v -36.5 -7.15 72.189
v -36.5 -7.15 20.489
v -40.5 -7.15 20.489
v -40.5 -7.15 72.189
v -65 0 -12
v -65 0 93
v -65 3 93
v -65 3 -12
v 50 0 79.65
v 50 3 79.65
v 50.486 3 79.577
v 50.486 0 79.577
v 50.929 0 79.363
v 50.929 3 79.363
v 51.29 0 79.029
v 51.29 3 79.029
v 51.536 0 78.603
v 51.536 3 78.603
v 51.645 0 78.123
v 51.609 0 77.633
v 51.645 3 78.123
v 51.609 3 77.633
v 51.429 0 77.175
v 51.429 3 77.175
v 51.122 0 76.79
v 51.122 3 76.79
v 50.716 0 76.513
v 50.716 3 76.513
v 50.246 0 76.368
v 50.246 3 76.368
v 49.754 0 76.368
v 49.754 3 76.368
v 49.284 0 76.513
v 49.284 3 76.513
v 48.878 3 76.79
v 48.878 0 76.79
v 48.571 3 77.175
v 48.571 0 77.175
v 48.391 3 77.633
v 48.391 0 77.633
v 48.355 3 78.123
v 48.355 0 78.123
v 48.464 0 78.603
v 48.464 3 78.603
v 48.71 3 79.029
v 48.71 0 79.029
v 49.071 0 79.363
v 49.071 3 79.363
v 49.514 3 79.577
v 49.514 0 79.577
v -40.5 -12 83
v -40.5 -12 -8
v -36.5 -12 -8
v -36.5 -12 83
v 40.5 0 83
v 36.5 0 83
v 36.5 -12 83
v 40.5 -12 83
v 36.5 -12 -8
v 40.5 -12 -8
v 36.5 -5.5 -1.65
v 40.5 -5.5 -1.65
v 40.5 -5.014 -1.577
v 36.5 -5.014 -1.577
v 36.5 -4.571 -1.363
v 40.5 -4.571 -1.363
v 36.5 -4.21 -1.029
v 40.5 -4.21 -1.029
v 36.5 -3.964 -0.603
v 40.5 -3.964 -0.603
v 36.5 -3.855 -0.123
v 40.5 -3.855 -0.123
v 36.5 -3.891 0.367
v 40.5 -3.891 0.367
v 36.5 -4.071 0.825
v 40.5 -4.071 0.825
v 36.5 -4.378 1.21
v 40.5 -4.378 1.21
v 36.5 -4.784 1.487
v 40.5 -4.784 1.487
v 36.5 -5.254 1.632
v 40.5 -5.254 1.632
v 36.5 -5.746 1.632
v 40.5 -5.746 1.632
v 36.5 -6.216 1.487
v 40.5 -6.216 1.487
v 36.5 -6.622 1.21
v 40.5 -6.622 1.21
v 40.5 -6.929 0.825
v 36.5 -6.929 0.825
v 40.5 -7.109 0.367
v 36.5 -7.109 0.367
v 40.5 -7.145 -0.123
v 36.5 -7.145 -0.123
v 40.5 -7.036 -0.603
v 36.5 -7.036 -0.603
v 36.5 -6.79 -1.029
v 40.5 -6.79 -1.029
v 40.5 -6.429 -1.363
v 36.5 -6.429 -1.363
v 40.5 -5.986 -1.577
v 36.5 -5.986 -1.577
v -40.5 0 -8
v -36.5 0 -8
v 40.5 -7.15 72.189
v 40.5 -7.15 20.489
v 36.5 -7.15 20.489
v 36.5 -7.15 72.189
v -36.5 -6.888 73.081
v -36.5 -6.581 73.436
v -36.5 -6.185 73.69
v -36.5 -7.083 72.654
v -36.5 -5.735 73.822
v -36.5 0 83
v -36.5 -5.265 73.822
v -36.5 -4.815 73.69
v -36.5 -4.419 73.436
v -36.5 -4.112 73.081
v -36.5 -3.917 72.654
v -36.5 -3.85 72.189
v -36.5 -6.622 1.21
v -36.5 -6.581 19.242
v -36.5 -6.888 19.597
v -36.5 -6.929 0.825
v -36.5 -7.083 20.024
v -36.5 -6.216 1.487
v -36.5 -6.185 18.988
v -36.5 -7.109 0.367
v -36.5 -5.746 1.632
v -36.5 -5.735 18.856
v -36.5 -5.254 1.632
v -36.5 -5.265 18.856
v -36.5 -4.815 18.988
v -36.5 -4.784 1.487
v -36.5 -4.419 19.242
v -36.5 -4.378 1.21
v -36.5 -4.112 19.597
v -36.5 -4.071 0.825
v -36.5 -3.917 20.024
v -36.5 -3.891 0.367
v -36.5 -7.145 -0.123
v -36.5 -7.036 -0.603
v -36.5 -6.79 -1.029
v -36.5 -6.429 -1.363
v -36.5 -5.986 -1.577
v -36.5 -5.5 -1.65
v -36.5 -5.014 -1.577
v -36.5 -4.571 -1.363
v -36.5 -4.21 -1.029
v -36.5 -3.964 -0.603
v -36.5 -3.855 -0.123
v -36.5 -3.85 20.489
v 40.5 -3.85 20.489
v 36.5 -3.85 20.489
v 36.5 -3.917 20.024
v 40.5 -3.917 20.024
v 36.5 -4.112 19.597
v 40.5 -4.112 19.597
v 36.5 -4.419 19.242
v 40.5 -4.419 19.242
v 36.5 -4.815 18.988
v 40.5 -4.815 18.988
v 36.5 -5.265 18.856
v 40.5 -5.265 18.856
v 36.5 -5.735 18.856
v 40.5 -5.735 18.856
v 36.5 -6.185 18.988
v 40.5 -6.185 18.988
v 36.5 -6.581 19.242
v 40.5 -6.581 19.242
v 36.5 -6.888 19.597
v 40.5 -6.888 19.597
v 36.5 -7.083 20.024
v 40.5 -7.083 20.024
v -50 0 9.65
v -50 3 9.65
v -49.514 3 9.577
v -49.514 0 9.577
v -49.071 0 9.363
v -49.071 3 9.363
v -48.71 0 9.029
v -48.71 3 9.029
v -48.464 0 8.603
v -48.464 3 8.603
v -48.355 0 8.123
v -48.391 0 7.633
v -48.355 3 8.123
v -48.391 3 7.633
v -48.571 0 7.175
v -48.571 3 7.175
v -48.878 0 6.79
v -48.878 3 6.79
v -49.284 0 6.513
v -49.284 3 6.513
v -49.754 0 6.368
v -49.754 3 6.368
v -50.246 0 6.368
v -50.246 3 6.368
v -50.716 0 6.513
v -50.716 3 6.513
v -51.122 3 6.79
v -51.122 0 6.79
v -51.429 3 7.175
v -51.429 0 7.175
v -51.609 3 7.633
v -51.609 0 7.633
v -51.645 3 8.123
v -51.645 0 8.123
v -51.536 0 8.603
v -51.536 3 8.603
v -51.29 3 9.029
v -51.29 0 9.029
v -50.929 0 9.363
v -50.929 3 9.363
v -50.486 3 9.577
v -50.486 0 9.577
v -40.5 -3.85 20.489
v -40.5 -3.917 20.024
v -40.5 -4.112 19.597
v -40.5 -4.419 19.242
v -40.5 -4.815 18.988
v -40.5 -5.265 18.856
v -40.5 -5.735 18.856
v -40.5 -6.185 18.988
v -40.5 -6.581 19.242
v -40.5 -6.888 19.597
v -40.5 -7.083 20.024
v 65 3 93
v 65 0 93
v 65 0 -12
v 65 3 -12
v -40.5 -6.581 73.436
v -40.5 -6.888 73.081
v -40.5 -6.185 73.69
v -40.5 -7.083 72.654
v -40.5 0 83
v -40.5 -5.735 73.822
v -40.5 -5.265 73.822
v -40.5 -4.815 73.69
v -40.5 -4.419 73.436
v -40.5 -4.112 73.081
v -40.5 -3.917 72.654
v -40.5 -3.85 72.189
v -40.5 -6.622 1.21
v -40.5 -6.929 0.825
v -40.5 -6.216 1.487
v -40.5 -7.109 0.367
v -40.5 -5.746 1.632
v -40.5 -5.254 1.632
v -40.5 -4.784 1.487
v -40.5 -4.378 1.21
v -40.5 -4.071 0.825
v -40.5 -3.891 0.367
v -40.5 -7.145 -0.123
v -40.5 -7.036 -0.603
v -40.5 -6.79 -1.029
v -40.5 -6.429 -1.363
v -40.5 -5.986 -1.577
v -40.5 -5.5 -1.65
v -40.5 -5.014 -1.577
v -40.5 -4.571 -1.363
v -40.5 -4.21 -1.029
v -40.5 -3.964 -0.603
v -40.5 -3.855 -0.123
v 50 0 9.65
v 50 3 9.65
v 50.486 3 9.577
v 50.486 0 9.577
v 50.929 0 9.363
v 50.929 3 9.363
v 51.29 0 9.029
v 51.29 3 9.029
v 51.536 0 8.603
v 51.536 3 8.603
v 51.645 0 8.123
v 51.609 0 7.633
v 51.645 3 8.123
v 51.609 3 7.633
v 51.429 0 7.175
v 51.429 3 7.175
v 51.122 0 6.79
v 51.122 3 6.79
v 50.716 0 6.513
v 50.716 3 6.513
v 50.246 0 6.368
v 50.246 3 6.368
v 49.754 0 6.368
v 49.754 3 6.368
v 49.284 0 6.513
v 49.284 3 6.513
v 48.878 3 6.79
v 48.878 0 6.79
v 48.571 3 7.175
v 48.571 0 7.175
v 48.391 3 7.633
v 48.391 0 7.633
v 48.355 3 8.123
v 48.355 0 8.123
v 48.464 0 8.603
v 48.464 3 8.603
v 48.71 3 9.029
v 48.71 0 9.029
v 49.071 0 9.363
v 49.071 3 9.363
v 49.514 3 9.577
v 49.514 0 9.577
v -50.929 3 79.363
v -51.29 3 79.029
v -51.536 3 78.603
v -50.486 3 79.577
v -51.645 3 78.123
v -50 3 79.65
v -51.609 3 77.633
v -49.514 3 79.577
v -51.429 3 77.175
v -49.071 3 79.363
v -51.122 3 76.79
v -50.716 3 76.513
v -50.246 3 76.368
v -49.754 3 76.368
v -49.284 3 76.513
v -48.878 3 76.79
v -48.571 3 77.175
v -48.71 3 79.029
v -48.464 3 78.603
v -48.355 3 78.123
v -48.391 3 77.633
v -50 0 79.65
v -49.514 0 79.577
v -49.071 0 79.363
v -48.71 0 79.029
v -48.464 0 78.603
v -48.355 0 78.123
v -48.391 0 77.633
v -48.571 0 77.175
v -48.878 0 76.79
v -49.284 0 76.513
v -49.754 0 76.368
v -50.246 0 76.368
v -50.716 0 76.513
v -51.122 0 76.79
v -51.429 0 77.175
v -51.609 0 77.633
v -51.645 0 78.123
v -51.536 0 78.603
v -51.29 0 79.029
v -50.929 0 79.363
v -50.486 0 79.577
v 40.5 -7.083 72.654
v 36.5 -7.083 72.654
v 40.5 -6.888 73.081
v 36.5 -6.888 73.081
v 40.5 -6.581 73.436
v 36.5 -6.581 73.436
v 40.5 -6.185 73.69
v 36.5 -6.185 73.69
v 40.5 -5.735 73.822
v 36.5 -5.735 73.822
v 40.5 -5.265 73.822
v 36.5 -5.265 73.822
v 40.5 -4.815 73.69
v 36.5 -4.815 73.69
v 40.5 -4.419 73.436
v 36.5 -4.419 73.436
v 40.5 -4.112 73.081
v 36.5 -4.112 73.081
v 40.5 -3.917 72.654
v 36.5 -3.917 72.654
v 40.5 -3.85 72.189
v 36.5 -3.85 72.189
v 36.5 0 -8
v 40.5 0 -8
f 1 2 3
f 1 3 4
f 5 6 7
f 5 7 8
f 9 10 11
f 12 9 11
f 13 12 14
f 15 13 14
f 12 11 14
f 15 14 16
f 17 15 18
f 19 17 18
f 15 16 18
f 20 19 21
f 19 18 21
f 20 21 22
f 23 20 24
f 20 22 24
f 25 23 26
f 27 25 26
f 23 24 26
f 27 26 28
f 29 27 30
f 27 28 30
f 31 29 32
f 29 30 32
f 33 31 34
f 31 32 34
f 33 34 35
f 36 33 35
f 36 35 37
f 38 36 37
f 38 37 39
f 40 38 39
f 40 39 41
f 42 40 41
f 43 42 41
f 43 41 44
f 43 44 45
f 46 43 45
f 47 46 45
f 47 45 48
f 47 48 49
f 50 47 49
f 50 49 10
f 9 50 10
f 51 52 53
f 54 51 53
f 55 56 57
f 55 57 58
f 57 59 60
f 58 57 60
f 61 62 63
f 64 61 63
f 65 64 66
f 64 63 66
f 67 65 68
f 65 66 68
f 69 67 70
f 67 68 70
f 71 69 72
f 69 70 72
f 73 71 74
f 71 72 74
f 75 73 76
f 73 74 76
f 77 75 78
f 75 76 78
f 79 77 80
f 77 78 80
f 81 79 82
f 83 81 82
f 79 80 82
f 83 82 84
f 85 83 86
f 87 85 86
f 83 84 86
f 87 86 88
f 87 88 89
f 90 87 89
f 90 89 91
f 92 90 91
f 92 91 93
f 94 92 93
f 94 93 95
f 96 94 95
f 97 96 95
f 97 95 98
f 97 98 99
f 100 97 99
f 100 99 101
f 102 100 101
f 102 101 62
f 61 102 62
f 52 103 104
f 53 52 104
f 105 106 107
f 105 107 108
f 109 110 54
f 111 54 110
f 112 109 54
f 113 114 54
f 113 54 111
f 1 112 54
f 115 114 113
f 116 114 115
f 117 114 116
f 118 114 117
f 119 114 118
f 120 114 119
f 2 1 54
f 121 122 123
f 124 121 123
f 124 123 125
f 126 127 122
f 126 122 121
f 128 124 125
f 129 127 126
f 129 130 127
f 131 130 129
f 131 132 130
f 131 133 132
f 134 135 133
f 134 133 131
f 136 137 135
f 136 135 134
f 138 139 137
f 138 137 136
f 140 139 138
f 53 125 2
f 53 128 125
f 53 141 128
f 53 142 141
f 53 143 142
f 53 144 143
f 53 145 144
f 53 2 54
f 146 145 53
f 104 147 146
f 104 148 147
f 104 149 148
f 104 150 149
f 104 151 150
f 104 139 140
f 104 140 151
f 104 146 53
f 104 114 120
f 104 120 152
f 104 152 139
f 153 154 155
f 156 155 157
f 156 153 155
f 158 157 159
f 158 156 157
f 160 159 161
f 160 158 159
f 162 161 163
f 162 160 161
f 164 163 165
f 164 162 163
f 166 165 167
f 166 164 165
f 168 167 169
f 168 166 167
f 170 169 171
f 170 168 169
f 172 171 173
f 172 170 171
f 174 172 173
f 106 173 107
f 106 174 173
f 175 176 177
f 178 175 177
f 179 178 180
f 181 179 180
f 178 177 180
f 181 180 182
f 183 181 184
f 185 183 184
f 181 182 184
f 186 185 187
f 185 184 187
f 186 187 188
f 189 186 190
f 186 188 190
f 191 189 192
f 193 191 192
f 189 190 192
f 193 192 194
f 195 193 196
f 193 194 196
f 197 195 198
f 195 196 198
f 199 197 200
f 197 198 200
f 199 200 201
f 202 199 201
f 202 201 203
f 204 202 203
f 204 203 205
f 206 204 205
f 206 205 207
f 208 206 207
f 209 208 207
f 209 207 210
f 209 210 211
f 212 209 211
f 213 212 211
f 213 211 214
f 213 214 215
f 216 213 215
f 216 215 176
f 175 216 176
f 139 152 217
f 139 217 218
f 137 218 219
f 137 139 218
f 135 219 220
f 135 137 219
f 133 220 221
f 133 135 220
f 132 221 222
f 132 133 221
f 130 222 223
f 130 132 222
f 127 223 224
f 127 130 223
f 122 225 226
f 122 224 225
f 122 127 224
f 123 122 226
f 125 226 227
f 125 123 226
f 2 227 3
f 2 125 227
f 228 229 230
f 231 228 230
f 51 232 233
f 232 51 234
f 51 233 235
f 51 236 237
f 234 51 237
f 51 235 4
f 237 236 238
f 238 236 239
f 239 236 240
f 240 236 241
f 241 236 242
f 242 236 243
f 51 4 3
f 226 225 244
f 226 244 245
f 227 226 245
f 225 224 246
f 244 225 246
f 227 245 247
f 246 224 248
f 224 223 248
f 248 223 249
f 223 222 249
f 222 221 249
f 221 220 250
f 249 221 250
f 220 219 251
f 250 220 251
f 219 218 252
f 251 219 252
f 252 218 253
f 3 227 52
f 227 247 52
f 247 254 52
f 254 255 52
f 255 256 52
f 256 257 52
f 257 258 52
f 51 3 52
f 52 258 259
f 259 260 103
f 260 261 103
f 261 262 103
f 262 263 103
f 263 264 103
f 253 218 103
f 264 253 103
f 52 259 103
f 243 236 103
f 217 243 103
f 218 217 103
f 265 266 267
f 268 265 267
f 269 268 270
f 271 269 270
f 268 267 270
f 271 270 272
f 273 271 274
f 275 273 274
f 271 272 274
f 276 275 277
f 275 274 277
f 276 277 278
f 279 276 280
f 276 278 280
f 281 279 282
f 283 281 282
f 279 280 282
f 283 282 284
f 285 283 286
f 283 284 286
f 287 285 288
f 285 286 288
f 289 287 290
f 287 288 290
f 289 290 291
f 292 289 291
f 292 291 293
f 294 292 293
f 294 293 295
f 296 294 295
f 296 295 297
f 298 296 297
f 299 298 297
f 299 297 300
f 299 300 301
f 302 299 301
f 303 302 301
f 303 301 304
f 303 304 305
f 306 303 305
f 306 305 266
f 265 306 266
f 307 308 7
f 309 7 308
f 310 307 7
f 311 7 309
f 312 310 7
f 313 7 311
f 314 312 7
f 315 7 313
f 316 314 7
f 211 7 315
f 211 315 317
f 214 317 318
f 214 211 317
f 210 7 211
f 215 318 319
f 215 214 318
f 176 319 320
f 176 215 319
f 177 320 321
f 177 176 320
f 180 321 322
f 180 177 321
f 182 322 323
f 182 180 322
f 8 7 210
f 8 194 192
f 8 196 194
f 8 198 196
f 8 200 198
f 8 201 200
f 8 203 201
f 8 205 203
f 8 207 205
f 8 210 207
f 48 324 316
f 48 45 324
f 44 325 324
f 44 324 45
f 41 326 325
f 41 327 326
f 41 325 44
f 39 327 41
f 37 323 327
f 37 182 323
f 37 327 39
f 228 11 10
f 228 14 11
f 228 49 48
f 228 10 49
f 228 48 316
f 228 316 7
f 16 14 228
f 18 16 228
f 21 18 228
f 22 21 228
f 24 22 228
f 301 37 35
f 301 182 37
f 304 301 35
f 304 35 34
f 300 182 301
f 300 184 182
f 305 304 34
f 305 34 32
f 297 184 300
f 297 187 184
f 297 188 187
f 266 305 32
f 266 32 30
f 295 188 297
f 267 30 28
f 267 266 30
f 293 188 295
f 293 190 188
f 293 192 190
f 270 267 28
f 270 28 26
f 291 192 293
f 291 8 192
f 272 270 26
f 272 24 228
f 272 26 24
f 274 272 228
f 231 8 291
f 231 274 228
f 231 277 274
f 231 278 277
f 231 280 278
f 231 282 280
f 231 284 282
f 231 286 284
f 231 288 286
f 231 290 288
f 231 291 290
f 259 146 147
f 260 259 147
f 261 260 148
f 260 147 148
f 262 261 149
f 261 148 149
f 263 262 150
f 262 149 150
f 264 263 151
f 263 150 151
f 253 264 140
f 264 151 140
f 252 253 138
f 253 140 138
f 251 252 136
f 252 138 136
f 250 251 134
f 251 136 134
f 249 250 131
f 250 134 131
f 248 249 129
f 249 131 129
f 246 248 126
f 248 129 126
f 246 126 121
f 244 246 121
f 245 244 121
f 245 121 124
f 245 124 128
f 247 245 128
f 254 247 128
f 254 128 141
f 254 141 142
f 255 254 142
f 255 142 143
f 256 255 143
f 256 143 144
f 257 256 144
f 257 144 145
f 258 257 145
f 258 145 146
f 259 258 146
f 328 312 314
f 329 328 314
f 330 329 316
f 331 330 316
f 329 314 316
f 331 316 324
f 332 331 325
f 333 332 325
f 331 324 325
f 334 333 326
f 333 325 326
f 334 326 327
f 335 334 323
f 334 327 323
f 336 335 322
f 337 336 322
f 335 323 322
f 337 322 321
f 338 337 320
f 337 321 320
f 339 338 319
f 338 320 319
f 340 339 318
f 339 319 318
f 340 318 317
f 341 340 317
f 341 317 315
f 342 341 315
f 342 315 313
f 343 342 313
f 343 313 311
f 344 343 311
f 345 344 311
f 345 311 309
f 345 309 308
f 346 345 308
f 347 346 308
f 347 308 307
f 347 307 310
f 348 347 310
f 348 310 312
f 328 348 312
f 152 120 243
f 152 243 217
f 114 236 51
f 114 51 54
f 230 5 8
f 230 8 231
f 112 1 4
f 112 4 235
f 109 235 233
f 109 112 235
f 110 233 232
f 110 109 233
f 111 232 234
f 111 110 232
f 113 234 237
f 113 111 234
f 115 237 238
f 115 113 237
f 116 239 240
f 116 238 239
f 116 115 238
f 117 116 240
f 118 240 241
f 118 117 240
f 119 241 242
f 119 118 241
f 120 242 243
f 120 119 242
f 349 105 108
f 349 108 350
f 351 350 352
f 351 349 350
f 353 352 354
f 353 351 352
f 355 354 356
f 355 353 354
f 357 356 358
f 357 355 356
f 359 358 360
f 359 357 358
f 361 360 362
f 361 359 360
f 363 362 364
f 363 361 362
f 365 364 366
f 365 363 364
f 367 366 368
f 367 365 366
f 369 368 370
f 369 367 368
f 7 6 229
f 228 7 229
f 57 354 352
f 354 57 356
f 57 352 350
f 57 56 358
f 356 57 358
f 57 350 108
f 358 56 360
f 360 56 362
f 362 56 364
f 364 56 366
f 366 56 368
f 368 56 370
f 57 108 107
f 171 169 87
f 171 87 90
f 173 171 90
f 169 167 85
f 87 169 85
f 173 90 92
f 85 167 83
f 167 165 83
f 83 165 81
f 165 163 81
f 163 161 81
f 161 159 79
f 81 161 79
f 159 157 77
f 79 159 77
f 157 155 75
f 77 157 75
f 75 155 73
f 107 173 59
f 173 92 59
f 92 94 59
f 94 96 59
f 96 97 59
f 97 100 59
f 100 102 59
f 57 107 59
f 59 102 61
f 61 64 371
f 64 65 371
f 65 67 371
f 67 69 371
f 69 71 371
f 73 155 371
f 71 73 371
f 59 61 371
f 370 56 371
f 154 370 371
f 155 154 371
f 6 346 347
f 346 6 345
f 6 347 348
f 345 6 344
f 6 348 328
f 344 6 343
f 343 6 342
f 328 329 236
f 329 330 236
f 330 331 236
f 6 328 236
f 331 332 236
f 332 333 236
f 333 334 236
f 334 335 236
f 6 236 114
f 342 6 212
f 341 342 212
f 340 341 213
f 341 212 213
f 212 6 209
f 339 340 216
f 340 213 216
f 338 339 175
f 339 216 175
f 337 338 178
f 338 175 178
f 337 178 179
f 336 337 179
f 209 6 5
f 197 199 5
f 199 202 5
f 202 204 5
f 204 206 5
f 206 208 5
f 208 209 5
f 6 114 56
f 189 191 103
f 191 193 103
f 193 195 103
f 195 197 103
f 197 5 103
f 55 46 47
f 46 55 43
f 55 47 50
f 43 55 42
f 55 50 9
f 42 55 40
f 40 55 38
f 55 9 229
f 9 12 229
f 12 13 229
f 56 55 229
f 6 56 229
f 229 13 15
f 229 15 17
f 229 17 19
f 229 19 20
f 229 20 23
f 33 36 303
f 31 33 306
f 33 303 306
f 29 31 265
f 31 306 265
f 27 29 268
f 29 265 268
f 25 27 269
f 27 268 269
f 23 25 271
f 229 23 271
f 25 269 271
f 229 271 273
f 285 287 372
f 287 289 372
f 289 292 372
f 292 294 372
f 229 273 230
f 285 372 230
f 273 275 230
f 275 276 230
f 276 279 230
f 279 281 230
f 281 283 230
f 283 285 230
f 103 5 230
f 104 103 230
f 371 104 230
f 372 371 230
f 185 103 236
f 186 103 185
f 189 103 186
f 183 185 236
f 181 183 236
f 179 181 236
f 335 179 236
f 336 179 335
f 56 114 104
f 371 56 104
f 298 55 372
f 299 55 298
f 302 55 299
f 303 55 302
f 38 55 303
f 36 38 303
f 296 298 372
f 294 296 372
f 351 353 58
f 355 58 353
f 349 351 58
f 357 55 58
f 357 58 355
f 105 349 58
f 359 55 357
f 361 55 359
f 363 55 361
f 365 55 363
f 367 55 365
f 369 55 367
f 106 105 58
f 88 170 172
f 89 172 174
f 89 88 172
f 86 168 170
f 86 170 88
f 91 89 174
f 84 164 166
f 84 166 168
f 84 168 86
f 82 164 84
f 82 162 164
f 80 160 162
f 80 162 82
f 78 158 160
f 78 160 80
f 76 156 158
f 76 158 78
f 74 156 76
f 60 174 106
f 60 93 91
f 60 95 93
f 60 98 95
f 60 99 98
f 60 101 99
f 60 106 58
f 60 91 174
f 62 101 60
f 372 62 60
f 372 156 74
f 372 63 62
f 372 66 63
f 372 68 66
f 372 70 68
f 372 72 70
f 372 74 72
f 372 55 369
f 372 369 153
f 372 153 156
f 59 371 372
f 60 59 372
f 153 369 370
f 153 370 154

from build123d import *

# Parameters (mm, degrees)
SKETCH_1_W         = 130
SKETCH_1_H         = 105
F_3MM_DEPTH        = 3
SKETCH_2_W         = 4
SKETCH_2_H         = 91
F_12MM_DEPTH       = 12
SKETCH_3_R         = 1.65
F_3P3MM_DEPTH      = 142.149743181
SKETCH_4_R         = 1.65
CUT_EXTRUDE1_DEPTH = 115.450862819


with BuildPart() as part:
    # 草图1 → 支架连接板_3mm (new body)
    with BuildSketch(Plane(origin=(0, 0, 0), x_dir=(1, 0, 0), z_dir=(0, 1, 0))):
        with Locations((0, -40.5)):
            Rectangle(SKETCH_1_W, SKETCH_1_H)
    extrude(amount=F_3MM_DEPTH)

    # 草图2 → 左右导轨_12mm (add)
    with BuildSketch(Plane(origin=(0, 0, 0), x_dir=(1, 0, 0), z_dir=(0, 1, 0))):
        with Locations((-38.5, -37.5)):
            Rectangle(SKETCH_2_W, SKETCH_2_H)
        with Locations((38.5, -37.5)):
            Rectangle(SKETCH_2_W, SKETCH_2_H)
    extrude(amount=-F_12MM_DEPTH)

    # 草图3 → 左右铰接孔及滑槽_3p3mm (cut, through all)
    with BuildSketch(Plane(origin=(40.5, 0, 0), x_dir=(0, 0, -1), z_dir=(1, 0, 0))):
        with Locations((0, -5.5)):
            Circle(SKETCH_3_R)
        with BuildLine():
            Line((-20.48913575, -7.15), (-72.18913575, -7.15))
            ThreePointArc((-72.18913575, -7.15), (-73.83913575, -5.5), (-72.18913575, -3.85))
            Line((-72.18913575, -3.85), (-20.48913575, -3.85))
            ThreePointArc((-20.48913575, -3.85), (-18.83913575, -5.5), (-20.48913575, -7.15))
        make_face()
    extrude(amount=-F_3P3MM_DEPTH, mode=Mode.SUBTRACT)

    # 草图4 → Cut-Extrude1 (cut, through all)
    with BuildSketch(Plane(origin=(0, 3, 0), x_dir=(1, 0, 0), z_dir=(0, 1, 0))):
        with Locations(Location((-50, -8, 0), (0, 0, 270))):
            Circle(SKETCH_4_R)
        with Locations(Location((-50, -78, 0), (0, 0, 270))):
            Circle(SKETCH_4_R)
        with Locations(Location((50, -8, 0), (0, 0, 270))):
            Circle(SKETCH_4_R)
        with Locations(Location((50, -78, 0), (0, 0, 270))):
            Circle(SKETCH_4_R)
    extrude(amount=-CUT_EXTRUDE1_DEPTH, mode=Mode.SUBTRACT)


solid = part.part
